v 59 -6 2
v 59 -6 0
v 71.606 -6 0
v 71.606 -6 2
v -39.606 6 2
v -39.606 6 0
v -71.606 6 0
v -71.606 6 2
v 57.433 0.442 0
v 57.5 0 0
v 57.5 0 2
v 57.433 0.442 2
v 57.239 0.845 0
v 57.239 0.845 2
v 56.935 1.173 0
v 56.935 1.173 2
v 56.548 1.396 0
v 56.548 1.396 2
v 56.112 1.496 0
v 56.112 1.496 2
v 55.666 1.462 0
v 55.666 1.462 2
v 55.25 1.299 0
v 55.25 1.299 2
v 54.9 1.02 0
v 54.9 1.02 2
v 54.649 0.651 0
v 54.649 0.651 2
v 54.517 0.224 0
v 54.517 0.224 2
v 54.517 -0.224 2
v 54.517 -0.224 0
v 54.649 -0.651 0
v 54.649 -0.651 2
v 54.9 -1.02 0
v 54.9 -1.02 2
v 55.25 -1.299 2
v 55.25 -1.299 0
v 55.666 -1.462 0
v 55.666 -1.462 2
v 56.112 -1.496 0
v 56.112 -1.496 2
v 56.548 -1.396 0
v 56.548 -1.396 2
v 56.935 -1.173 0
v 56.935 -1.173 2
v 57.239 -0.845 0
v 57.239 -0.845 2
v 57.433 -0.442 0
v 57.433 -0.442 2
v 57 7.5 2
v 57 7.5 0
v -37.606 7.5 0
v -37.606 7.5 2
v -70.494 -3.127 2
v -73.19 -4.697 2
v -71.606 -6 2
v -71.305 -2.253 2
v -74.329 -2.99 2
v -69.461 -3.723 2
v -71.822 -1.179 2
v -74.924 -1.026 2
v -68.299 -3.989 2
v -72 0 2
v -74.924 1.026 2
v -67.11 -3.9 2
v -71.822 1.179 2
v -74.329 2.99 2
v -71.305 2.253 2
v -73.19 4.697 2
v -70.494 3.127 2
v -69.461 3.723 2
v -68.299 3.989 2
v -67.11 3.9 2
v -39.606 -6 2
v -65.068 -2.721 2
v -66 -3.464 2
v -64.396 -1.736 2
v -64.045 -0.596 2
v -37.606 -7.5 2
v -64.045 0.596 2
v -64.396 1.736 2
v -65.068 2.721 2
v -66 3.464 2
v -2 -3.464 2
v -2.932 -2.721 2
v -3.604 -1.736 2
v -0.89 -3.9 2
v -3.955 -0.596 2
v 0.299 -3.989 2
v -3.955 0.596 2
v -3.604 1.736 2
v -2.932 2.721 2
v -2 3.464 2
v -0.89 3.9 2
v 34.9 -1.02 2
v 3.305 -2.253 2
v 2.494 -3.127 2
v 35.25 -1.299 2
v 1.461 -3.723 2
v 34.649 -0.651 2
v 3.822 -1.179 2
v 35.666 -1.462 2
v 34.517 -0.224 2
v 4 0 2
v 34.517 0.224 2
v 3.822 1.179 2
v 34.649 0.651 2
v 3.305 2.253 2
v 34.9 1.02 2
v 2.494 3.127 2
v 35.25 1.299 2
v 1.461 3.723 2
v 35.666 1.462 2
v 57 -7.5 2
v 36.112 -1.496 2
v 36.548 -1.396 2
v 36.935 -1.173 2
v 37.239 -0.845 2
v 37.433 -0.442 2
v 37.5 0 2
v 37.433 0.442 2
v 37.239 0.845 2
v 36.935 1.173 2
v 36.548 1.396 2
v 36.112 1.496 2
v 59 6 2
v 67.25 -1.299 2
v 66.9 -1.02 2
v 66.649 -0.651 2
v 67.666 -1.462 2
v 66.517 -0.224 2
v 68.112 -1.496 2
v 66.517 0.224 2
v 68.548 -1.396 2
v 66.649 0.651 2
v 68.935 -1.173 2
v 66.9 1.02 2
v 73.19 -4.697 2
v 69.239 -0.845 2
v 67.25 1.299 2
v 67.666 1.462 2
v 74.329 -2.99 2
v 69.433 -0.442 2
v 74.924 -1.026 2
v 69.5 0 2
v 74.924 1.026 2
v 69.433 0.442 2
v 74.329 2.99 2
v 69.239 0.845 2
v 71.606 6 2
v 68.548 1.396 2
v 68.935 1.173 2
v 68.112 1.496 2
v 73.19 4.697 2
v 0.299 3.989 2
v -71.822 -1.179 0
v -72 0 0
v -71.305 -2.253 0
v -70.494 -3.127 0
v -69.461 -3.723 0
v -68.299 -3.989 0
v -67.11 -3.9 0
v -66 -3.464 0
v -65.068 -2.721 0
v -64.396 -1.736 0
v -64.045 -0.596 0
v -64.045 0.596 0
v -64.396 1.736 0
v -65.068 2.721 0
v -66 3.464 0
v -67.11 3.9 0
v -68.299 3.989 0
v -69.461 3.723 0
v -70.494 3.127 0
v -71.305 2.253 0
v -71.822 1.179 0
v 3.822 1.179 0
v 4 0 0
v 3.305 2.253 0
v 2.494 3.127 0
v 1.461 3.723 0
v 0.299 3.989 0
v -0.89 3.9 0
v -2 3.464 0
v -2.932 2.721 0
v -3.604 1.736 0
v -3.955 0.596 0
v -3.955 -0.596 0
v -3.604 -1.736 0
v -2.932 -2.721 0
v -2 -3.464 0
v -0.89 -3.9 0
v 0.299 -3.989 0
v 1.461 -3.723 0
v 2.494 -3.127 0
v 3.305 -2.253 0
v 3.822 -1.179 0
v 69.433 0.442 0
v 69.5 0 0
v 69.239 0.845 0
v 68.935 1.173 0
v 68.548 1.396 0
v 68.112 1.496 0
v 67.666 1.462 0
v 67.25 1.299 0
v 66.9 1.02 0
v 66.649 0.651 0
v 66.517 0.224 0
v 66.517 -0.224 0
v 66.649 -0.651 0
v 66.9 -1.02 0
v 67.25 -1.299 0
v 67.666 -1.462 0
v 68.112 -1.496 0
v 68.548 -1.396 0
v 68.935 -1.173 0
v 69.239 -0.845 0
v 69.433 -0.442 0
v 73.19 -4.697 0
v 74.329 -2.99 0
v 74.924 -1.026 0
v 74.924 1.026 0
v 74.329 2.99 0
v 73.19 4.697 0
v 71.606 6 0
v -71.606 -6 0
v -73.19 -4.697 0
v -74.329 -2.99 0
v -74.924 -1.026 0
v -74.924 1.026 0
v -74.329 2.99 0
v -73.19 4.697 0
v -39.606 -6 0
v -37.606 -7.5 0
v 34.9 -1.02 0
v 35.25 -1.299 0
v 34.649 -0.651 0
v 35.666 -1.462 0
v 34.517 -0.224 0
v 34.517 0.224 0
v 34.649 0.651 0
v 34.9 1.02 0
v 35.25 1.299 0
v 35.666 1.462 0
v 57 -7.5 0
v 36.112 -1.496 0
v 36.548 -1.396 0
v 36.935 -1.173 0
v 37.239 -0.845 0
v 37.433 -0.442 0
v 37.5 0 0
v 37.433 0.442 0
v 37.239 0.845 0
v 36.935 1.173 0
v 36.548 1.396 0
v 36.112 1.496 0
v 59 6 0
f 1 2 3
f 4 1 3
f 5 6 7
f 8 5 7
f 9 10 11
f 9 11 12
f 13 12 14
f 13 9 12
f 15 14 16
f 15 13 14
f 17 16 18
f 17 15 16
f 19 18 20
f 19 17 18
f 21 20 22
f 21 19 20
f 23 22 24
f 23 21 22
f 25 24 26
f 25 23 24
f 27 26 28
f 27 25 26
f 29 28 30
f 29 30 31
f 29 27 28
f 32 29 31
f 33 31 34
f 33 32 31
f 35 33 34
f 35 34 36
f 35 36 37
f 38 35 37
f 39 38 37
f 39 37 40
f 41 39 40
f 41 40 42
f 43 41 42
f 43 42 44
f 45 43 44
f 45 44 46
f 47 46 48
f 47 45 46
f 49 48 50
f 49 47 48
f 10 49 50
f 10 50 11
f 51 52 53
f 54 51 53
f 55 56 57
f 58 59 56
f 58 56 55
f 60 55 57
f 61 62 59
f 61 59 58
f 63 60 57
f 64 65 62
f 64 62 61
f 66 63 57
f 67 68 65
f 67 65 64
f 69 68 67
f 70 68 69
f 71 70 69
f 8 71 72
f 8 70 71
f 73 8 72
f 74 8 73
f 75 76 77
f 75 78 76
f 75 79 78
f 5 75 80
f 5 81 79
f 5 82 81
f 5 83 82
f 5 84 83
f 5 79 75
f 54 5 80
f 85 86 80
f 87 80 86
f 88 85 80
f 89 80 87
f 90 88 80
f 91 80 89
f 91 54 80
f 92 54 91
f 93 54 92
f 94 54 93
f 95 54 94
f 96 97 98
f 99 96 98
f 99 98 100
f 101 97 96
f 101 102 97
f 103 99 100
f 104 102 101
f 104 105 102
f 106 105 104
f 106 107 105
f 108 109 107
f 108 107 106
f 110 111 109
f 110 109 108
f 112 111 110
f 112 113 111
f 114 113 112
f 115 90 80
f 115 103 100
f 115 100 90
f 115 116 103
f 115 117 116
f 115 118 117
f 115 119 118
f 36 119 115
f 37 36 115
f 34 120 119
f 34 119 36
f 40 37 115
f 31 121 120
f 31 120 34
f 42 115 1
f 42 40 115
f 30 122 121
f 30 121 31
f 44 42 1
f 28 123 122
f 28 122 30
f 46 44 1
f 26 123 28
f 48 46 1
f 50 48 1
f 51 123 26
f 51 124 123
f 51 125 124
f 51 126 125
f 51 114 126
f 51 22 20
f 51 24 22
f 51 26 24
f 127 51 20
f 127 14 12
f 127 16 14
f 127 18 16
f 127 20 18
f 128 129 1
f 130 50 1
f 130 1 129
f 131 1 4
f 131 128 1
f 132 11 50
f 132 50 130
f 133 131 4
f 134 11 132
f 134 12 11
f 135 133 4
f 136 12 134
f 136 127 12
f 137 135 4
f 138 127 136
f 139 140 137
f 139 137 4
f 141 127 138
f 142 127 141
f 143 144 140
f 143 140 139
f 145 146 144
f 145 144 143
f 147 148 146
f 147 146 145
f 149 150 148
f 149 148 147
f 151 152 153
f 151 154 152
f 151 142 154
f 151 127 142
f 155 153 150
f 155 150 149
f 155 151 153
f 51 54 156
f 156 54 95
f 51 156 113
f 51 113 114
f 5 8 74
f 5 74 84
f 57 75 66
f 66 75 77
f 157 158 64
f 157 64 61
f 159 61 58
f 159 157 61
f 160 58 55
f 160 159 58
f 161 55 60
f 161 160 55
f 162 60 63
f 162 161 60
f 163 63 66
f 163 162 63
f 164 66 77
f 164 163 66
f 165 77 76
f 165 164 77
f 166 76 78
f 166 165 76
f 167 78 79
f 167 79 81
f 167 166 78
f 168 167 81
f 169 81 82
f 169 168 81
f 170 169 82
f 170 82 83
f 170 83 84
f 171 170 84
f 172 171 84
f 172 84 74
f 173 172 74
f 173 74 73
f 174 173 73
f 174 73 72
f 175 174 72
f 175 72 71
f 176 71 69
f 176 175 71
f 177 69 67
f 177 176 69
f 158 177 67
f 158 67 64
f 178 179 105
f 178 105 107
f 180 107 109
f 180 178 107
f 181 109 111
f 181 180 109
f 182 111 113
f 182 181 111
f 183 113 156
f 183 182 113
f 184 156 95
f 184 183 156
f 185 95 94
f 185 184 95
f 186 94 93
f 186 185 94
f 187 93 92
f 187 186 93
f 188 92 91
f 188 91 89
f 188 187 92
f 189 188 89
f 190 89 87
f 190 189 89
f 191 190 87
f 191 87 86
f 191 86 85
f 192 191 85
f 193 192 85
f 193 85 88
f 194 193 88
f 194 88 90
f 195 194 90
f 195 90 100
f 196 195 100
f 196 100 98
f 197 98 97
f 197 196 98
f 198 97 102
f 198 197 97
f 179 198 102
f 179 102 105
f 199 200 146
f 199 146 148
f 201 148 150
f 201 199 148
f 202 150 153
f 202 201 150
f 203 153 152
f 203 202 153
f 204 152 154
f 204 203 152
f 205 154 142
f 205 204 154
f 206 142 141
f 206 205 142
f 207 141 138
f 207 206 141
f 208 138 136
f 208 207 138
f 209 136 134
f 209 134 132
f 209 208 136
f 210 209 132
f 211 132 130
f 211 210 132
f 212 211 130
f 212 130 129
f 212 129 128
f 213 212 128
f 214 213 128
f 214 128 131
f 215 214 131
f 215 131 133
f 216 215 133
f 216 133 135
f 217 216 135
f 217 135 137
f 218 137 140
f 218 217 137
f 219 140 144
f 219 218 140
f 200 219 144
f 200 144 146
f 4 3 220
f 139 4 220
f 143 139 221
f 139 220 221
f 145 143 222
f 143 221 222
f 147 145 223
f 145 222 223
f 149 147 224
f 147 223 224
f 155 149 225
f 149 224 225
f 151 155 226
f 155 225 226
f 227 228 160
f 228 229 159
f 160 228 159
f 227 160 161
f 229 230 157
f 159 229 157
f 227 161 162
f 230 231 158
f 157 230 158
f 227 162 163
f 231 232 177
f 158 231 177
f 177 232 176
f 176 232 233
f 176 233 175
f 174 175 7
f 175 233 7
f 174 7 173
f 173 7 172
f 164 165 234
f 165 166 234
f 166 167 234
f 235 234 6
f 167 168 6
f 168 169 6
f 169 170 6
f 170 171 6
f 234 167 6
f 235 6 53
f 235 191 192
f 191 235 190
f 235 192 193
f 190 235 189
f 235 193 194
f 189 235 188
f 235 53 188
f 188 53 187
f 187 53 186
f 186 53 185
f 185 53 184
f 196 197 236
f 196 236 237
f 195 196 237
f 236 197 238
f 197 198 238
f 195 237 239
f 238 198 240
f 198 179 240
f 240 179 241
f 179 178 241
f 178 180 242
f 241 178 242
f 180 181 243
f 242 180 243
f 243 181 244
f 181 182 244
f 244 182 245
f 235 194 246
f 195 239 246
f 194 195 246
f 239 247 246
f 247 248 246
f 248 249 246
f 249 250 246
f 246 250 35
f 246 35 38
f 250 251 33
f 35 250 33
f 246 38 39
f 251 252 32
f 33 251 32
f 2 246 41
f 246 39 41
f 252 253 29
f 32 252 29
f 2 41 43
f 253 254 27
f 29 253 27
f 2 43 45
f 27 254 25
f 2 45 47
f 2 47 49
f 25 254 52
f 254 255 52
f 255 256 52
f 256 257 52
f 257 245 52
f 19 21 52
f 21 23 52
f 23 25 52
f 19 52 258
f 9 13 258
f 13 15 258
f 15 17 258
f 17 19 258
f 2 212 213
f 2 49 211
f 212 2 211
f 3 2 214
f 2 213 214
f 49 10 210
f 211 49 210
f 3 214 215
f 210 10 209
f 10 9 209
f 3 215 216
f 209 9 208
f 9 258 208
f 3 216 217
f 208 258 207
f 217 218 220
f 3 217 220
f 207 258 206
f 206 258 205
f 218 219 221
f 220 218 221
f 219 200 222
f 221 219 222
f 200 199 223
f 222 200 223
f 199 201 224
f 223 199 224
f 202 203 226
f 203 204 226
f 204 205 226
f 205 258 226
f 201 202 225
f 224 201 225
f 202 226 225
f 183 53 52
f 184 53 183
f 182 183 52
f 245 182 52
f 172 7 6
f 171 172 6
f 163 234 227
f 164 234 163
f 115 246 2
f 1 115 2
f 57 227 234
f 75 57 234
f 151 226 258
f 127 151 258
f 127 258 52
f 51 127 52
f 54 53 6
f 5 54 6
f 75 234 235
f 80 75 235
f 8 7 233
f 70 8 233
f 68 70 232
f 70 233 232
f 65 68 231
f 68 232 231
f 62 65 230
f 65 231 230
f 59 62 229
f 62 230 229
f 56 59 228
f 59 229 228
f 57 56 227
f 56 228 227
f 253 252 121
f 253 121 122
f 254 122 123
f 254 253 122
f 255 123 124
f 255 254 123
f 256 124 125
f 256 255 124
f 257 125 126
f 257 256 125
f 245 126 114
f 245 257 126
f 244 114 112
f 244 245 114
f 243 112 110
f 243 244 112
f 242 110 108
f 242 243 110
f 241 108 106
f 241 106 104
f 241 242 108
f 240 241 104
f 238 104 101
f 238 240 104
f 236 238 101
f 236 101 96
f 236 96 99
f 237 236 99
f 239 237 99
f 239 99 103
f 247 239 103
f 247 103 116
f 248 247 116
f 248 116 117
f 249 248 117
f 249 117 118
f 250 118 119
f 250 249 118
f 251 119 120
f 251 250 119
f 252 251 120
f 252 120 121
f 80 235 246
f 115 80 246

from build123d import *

# Parameters (mm, degrees)
ESQUISSE1_R      = 1.5
ESQUISSE1_R_2    = 4
EXTRUSION1_DEPTH = 2


with BuildPart() as part:
    # Esquisse1 → Extrusion1 (new body)
    with BuildSketch(Plane.XY):
        with BuildLine():
            Line((71.605551275, 6), (59, 6))
            Line((59, 6), (57, 7.5))
            Line((57, 7.5), (-37.605551275, 7.5))
            Line((-37.605551275, 7.5), (-39.605551275, 6))
            Line((-39.605551275, 6), (-71.605551275, 6))
            ThreePointArc((-71.605551275, 6), (-75, 0), (-71.605551275, -6))
            Line((-71.605551275, -6), (-39.605551275, -6))
            Line((-39.605551275, -6), (-37.605551275, -7.5))
            Line((-37.605551275, -7.5), (57, -7.5))
            Line((57, -7.5), (59, -6))
            Line((59, -6), (71.605551275, -6))
            ThreePointArc((71.605551275, -6), (75, 0), (71.605551275, 6))
        make_face()
        with Locations((68, 0)):
            Circle(ESQUISSE1_R, mode=Mode.SUBTRACT)
        with Locations(Location((-68, 0, 0), (0, 0, 180))):
            Circle(ESQUISSE1_R_2, mode=Mode.SUBTRACT)
        Circle(ESQUISSE1_R_2, mode=Mode.SUBTRACT)
        with Locations((56, 0)):
            Circle(ESQUISSE1_R, mode=Mode.SUBTRACT)
        with Locations((36, 0)):
            Circle(ESQUISSE1_R, mode=Mode.SUBTRACT)
    extrude(amount=EXTRUSION1_DEPTH)


solid = part.part
